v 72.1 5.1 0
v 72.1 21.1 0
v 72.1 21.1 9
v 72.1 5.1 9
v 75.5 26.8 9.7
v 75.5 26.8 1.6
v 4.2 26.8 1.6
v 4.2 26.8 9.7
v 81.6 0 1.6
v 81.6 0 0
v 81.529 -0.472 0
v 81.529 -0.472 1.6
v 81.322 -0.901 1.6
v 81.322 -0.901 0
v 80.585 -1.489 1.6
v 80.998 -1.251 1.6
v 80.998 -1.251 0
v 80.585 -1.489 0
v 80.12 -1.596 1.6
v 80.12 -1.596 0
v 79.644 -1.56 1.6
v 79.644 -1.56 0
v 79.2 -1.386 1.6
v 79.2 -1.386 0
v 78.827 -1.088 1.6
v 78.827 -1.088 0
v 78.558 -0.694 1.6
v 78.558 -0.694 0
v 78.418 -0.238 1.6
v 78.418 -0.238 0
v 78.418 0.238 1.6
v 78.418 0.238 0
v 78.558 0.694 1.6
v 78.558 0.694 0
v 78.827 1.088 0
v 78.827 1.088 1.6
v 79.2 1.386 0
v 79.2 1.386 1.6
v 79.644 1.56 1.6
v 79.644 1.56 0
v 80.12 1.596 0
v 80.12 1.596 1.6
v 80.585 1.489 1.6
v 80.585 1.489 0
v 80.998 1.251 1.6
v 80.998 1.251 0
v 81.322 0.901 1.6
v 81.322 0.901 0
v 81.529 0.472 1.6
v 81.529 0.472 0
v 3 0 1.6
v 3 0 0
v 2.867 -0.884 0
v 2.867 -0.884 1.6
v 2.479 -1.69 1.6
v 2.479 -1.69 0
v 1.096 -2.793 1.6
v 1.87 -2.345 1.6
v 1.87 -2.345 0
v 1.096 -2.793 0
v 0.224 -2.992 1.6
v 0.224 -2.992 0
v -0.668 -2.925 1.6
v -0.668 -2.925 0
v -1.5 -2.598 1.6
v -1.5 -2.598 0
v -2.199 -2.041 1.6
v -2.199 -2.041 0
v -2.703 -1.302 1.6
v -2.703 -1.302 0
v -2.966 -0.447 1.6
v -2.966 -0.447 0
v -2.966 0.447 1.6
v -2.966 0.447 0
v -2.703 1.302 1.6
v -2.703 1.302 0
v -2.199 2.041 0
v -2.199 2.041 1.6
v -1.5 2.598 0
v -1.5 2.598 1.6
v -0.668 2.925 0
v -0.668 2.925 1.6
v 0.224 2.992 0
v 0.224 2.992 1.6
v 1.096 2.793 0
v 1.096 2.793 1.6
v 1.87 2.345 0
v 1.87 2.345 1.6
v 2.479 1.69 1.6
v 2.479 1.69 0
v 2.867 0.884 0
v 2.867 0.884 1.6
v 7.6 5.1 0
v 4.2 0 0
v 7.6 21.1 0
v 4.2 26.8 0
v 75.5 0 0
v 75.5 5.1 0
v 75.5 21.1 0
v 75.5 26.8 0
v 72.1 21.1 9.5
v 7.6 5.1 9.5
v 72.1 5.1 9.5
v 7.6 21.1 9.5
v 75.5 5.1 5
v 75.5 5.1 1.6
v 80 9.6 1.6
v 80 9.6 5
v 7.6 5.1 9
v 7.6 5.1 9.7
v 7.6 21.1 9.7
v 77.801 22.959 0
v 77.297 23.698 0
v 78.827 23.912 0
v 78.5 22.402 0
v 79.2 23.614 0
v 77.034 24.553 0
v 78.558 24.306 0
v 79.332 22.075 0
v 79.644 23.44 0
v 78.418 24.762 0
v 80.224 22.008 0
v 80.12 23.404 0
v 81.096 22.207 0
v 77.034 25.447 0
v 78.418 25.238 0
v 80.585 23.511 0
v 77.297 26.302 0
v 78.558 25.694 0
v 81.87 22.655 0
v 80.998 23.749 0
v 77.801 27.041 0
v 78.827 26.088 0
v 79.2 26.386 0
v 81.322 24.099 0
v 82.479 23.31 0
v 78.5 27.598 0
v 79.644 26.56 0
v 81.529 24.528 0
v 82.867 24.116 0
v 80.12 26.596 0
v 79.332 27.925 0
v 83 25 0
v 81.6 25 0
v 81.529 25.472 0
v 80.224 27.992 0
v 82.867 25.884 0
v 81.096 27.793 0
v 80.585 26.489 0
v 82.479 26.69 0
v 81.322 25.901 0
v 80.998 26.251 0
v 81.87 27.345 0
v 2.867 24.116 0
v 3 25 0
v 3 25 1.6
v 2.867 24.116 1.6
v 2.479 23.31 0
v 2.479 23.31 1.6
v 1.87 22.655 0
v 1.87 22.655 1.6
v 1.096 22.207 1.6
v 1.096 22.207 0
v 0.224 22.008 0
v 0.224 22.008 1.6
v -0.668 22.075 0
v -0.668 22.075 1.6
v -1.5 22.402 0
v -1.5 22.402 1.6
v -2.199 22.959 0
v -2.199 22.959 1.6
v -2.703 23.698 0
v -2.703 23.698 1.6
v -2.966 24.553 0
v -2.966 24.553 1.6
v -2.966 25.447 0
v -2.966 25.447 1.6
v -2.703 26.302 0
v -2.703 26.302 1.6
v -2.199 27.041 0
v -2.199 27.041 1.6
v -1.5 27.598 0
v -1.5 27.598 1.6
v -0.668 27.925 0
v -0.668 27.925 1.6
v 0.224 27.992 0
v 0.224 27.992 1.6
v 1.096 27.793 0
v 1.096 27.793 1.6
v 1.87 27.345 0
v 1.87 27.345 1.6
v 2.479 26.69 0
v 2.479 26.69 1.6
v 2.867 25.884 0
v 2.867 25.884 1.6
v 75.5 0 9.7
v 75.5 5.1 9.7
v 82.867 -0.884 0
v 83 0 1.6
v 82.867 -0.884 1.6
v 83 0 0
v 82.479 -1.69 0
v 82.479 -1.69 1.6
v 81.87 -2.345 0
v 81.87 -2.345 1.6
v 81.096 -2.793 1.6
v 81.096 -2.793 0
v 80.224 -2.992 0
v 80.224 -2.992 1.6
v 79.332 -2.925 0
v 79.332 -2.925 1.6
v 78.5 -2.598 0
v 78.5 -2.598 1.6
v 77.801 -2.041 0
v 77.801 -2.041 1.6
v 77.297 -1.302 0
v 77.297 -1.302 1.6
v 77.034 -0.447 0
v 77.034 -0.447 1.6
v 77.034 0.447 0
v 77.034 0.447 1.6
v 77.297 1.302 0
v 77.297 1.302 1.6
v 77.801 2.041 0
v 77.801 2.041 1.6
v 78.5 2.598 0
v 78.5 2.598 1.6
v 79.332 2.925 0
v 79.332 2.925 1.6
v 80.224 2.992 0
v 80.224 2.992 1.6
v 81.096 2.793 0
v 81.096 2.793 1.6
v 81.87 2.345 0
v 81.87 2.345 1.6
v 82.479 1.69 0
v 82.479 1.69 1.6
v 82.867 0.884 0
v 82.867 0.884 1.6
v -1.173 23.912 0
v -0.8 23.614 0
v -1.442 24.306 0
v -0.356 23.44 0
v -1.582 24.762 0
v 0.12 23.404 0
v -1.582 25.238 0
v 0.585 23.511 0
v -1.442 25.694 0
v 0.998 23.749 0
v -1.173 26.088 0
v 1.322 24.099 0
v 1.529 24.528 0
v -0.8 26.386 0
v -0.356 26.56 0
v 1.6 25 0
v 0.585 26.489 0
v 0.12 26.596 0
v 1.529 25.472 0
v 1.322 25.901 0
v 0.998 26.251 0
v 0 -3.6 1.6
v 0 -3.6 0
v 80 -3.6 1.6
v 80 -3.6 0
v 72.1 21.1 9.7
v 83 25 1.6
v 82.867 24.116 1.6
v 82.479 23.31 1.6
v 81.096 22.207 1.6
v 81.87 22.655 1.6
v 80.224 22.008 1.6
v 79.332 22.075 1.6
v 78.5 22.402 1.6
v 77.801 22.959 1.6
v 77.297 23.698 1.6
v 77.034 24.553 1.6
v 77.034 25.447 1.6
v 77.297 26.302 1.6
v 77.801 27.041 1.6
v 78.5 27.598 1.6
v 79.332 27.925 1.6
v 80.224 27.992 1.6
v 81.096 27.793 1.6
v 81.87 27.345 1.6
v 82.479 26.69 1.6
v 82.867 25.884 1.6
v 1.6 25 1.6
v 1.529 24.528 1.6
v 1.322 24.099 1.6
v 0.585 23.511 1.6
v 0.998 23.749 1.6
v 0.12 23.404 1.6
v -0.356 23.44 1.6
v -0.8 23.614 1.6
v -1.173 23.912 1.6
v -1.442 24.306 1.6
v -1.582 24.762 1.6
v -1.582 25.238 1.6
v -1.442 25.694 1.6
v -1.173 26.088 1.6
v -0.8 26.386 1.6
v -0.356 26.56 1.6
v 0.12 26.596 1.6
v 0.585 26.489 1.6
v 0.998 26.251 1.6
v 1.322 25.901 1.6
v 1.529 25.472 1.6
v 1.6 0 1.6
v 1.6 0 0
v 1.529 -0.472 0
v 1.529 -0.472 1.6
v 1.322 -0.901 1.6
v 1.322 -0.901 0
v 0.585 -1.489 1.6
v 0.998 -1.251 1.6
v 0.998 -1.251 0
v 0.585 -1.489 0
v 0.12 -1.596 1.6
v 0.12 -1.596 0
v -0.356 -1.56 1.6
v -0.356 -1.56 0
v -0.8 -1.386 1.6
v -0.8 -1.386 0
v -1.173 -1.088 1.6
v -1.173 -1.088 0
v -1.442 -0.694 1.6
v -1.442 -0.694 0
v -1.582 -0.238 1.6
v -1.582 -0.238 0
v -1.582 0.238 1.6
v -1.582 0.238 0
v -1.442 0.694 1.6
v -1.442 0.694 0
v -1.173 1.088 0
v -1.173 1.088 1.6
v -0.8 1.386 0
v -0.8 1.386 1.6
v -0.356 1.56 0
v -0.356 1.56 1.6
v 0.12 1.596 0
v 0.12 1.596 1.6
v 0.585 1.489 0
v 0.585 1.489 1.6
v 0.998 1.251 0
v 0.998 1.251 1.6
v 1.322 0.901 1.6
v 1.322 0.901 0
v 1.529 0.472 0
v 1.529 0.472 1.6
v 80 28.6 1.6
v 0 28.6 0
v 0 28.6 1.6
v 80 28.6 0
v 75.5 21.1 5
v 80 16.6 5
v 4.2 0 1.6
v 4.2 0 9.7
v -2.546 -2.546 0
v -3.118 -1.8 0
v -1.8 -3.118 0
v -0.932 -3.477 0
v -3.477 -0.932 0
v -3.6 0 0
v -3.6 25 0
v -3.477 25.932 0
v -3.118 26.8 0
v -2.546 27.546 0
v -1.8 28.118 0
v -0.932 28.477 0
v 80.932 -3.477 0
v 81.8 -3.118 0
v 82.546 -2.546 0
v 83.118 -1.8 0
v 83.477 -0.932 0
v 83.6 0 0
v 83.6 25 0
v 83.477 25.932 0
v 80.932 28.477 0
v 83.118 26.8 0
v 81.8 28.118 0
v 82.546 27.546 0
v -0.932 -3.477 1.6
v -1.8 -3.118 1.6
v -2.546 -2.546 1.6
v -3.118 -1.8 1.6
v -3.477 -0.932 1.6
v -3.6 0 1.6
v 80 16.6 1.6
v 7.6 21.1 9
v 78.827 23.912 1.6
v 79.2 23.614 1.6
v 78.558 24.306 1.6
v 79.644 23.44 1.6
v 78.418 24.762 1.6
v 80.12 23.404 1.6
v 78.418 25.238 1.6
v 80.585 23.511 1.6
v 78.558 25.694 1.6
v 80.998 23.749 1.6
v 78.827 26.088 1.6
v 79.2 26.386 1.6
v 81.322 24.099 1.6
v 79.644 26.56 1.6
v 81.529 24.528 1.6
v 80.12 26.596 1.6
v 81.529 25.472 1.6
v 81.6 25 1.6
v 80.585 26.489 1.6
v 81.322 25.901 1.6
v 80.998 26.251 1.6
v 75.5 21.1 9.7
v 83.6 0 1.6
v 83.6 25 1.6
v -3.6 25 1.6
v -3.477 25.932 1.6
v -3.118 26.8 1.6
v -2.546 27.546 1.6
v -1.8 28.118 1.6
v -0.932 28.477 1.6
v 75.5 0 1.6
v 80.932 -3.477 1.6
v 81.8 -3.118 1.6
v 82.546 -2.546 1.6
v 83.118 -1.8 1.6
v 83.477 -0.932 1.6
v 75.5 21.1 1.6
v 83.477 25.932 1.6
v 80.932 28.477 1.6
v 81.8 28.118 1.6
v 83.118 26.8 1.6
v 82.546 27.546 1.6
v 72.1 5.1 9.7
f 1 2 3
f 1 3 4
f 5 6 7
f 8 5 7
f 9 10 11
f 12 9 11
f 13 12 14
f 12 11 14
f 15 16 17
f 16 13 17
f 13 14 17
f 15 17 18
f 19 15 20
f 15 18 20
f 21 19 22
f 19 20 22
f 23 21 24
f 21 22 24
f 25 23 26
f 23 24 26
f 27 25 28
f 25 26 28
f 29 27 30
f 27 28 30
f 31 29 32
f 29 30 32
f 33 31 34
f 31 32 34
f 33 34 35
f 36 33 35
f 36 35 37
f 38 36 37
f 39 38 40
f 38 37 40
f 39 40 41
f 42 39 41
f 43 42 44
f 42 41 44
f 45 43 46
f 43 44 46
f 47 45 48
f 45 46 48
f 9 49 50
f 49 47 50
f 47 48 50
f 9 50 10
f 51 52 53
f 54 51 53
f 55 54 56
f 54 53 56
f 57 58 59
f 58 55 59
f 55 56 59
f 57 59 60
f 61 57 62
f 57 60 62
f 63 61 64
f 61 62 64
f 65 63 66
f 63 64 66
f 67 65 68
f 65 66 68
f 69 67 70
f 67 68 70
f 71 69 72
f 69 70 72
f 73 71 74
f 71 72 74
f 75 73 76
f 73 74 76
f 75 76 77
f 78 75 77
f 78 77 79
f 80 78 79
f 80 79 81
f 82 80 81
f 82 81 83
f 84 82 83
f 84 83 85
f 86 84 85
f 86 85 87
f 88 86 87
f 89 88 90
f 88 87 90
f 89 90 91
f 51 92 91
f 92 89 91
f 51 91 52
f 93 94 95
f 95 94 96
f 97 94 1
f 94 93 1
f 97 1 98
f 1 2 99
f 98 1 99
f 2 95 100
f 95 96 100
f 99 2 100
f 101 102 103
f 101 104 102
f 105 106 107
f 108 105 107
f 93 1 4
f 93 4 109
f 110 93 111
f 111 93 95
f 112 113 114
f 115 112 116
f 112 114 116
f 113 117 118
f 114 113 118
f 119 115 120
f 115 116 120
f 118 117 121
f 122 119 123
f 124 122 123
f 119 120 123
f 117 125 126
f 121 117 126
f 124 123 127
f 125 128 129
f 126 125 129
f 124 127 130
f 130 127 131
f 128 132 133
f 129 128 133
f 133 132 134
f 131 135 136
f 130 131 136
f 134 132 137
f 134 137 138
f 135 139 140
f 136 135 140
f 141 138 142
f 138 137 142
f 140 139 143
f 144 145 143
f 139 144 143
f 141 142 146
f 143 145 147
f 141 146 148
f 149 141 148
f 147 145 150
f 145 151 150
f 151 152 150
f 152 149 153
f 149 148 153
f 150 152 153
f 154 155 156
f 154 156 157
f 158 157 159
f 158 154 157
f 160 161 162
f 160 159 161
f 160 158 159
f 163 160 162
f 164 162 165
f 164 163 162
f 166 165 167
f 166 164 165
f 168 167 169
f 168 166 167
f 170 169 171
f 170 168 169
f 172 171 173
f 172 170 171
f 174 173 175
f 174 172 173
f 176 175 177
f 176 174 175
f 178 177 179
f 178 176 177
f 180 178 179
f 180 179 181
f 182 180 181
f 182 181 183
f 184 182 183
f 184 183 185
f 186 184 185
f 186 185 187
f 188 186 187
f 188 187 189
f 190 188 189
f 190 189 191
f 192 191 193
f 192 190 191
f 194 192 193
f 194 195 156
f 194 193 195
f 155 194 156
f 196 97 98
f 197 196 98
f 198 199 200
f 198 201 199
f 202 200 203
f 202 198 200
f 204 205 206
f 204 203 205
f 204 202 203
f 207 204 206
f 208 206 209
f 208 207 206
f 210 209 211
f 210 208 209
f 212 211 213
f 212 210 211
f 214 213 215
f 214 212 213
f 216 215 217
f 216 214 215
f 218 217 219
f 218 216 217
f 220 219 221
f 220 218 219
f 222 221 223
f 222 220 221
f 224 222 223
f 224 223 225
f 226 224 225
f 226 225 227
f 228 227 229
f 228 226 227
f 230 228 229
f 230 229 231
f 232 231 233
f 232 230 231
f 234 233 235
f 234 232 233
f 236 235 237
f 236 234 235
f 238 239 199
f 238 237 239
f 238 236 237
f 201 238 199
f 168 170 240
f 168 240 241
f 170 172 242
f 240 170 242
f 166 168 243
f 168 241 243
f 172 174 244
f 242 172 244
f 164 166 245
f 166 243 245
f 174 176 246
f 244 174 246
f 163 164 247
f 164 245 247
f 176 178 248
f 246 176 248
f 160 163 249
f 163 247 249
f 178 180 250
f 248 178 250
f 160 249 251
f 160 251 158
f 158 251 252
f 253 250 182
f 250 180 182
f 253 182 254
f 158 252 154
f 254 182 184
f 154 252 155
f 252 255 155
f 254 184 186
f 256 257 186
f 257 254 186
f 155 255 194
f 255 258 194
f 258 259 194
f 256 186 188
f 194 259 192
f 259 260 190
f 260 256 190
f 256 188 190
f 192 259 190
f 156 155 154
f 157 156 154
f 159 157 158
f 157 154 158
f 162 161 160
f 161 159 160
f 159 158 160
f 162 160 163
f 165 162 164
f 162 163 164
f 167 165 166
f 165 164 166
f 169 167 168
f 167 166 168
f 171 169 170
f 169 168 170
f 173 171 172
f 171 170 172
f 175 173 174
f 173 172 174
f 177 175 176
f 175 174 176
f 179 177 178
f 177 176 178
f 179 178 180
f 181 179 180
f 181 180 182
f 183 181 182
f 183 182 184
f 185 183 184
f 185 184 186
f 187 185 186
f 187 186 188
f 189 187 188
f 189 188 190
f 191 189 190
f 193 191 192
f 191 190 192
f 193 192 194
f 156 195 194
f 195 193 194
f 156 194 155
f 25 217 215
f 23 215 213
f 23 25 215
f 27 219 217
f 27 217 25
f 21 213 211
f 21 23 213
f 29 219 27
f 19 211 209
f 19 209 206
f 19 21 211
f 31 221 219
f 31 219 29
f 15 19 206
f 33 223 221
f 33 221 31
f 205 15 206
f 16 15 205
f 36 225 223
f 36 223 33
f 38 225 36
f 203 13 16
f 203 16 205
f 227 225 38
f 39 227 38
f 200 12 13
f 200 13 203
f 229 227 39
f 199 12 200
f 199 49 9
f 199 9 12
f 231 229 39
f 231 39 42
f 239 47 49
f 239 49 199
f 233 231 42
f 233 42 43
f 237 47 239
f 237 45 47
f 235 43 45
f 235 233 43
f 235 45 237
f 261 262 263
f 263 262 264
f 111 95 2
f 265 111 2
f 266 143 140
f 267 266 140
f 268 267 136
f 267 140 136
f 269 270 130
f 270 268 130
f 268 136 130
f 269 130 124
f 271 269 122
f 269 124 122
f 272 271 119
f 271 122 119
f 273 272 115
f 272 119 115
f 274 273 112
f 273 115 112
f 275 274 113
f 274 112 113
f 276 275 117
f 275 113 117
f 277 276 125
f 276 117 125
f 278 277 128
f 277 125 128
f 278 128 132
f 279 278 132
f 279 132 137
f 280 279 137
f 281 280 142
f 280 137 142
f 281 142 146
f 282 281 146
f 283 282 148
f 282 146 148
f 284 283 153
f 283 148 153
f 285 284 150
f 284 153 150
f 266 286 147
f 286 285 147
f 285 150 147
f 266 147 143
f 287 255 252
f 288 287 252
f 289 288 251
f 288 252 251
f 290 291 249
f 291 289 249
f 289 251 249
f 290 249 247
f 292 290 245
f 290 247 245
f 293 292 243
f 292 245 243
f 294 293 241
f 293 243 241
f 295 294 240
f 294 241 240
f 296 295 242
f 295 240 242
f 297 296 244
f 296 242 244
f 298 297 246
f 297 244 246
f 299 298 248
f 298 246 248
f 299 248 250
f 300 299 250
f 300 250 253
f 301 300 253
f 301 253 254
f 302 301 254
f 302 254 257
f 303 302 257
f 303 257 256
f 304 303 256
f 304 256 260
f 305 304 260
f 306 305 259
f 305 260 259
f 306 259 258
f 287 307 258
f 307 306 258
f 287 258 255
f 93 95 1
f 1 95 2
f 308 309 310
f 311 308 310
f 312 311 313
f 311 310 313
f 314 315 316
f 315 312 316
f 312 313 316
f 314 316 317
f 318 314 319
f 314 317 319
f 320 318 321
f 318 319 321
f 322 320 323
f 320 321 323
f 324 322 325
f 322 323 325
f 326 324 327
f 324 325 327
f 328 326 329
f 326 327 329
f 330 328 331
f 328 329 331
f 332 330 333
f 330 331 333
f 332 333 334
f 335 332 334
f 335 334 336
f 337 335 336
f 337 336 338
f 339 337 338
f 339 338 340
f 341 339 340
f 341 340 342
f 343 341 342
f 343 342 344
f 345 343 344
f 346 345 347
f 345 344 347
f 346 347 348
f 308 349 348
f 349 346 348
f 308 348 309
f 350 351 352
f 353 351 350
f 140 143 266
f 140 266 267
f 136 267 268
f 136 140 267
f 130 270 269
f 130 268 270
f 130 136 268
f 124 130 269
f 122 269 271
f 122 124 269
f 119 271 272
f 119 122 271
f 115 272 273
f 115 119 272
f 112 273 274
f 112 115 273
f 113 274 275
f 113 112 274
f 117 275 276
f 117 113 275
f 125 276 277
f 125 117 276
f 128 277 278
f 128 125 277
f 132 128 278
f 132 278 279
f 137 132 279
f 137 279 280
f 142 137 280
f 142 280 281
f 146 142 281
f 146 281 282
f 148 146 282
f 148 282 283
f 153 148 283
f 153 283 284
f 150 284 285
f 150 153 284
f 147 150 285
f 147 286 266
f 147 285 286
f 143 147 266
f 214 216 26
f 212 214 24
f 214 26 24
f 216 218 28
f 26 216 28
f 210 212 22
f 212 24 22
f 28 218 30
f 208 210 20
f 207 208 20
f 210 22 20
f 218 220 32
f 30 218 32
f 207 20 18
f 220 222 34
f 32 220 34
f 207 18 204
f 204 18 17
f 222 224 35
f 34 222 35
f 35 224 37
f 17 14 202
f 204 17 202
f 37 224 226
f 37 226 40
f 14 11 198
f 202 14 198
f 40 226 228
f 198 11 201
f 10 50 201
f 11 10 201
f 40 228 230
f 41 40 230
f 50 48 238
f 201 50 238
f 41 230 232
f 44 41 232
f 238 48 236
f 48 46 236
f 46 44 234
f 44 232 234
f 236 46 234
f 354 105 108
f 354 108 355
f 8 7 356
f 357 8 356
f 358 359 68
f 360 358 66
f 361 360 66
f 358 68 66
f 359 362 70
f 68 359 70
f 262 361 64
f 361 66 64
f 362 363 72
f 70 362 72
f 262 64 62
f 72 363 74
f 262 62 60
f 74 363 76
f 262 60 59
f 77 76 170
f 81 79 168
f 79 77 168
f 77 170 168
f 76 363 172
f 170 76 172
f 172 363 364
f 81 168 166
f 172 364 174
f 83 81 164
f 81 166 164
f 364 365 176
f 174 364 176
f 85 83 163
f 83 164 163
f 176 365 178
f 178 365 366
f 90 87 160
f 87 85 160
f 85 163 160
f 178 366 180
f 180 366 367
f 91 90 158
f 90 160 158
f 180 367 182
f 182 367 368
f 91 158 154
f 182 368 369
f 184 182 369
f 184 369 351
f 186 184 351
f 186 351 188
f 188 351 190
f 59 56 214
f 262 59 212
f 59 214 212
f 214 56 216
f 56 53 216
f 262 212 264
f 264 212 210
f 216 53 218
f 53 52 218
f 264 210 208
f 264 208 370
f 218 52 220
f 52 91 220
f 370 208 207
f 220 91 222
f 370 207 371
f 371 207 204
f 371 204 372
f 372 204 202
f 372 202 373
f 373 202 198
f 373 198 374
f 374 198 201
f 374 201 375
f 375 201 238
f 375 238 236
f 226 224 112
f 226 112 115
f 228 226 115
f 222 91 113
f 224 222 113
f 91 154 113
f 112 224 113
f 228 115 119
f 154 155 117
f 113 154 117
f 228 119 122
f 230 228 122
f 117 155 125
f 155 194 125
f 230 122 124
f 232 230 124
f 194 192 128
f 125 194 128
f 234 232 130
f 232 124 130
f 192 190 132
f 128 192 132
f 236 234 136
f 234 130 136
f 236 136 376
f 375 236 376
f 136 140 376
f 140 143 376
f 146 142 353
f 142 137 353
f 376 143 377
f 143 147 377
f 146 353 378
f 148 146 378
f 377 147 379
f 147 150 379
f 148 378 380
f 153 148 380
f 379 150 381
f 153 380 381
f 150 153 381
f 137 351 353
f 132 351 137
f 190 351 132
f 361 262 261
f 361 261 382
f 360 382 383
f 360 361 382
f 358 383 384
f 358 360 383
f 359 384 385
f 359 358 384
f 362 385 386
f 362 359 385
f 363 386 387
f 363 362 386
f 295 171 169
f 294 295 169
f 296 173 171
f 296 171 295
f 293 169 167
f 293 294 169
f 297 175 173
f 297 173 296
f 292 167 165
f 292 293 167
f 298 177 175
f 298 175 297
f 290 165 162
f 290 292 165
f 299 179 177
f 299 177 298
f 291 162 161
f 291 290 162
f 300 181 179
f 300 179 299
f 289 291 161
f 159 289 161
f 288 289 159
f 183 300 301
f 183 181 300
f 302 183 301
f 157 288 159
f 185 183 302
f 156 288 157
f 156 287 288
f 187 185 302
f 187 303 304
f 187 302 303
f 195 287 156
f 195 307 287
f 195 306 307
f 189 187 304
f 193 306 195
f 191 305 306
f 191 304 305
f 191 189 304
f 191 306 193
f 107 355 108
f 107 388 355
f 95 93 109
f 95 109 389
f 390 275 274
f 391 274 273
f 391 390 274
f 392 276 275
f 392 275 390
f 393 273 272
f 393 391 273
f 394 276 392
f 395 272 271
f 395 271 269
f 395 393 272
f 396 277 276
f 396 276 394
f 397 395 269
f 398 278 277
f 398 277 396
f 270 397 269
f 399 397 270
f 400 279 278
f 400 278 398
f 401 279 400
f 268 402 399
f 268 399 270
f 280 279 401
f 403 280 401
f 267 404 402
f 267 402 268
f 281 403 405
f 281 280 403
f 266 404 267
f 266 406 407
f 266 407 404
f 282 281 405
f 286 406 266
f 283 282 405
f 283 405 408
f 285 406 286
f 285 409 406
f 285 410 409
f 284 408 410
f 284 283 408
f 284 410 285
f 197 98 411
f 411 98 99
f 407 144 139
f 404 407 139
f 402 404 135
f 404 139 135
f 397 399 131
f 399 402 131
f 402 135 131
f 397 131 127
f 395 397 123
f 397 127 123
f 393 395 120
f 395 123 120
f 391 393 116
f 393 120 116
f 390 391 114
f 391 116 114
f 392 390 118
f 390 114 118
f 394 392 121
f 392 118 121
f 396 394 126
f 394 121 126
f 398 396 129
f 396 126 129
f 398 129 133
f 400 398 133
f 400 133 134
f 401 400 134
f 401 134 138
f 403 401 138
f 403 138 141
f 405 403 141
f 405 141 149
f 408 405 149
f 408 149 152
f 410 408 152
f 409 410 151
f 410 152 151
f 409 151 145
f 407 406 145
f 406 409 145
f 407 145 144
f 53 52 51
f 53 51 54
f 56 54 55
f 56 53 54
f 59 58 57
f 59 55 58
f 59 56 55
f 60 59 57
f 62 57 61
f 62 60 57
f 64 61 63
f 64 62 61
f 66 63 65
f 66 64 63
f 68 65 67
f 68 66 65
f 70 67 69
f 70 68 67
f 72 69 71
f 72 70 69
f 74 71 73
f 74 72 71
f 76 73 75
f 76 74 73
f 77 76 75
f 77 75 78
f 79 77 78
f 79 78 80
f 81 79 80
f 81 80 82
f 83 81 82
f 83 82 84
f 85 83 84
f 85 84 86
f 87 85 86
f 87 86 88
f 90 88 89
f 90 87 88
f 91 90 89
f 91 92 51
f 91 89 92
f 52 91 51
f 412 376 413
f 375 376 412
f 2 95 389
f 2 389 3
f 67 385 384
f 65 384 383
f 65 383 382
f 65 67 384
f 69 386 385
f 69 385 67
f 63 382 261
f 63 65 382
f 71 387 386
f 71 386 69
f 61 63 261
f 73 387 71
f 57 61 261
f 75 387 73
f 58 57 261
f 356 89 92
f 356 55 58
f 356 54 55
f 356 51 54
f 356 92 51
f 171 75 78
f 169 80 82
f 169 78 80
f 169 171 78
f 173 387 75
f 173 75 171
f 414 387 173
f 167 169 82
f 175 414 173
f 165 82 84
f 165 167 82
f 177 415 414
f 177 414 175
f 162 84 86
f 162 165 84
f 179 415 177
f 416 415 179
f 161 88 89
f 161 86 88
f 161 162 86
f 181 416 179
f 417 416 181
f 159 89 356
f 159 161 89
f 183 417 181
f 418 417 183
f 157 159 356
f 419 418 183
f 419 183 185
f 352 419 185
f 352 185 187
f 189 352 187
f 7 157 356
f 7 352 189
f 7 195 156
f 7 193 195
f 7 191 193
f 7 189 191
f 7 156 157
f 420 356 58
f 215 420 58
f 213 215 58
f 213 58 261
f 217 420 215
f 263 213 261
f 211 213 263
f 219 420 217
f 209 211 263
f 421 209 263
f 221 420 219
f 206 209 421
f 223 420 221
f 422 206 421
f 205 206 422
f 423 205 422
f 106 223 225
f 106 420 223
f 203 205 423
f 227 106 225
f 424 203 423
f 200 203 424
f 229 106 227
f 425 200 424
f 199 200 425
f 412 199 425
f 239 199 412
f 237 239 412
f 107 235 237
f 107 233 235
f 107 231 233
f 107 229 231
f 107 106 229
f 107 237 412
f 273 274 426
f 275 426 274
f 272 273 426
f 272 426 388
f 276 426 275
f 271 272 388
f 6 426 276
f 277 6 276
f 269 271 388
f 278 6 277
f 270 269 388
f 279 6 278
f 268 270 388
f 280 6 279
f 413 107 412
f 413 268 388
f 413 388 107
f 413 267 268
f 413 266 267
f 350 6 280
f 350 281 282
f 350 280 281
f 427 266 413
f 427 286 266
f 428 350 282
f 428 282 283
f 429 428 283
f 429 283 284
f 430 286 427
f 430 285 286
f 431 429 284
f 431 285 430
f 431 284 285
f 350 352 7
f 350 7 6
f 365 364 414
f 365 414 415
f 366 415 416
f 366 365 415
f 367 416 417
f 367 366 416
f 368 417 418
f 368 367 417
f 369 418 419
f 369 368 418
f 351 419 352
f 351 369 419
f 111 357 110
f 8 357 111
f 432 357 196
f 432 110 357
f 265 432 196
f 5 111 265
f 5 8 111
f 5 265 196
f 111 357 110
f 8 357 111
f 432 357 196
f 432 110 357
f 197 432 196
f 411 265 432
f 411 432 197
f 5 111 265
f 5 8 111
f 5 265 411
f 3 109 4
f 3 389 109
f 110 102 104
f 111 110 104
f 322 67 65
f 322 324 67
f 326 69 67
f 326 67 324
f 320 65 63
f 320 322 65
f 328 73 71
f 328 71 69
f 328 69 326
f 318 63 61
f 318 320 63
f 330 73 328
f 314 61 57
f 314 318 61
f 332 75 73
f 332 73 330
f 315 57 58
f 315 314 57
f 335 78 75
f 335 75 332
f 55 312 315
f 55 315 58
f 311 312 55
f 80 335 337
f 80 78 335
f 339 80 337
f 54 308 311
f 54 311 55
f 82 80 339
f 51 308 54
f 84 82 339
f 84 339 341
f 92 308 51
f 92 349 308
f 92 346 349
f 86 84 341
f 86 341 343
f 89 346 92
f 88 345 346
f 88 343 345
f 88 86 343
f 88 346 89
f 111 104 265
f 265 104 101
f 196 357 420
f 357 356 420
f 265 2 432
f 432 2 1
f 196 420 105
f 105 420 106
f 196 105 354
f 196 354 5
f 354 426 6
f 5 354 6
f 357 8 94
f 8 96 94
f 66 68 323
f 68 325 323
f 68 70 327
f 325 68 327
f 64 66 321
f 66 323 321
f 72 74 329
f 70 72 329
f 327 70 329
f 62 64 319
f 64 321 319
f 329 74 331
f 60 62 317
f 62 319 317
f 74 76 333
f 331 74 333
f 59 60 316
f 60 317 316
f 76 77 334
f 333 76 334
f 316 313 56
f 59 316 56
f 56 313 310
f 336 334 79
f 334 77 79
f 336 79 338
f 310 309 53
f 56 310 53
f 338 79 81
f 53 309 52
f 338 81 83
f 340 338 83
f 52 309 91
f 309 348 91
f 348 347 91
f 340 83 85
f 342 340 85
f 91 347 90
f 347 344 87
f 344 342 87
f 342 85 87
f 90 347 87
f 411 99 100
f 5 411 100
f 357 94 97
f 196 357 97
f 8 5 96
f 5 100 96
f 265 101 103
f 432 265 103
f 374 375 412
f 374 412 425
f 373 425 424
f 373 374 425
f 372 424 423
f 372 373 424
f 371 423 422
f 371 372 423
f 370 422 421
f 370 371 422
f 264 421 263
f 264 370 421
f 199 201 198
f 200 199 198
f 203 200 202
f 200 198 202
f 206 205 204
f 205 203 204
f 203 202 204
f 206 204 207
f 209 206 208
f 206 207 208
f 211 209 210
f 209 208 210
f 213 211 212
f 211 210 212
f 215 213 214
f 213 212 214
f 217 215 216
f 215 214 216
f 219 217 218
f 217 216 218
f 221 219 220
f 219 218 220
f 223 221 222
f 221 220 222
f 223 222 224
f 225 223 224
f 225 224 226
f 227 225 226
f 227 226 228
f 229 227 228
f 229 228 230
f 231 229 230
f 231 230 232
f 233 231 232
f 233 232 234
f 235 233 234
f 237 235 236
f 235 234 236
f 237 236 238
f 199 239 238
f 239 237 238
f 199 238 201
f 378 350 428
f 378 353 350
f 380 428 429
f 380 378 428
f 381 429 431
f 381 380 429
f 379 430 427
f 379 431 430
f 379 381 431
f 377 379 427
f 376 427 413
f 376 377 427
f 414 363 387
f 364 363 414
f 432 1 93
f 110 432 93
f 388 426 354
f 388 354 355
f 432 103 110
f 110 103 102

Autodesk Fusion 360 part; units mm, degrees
sketch "Skizze1" plane through (0, 0, 0) normal (0, 0, 1) x (1, 0, 0) in component "i2c display"
  circle A0 centre (0, 0) radius 3.6
  circle A1 centre (0, 25) radius 3.6
  circle A2 centre (80, 25) radius 3.6
  circle A3 centre (80, 0) radius 3.6
  line L0 (0, -3.6) -> (80, -3.6)
  line L1 (-3.6, 0) -> (-3.6, 25)
  line L2 (0, 28.6) -> (80, 28.6)
  line L3 (83.6, 25) -> (83.6, 0)
  line L4 (4.2, 0) -> (75.5, 0)
  line L5 (75.5, 0) -> (75.5, 26.8)
  line L6 (75.5, 26.8) -> (4.2, 26.8)
  line L7 (4.2, 26.8) -> (4.2, 0)
  line L8 (7.6, 21.1) -> (72.1, 21.1)
  line L9 (72.1, 21.1) -> (72.1, 5.1)
  line L10 (72.1, 5.1) -> (7.6, 5.1)
  line L11 (7.6, 5.1) -> (7.6, 21.1)
  circle A4 centre (0, 0) radius 3
  circle A5 centre (0, 25) radius 3
  circle A6 centre (80, 25) radius 3
  circle A7 centre (80, 0) radius 3
  circle A8 centre (0, 25) radius 1.6
  circle A9 centre (0, 0) radius 1.6
  circle A10 centre (80, 25) radius 1.6
  circle A11 centre (80, 0) radius 1.6
  line L12 (75.5, 5.1) -> (80, 9.6)
  line L13 (75.5, 5.1) -> (81.864, 5.1) construction
  line L14 (75.5, 21.1) -> (80, 16.6)
  line L15 (80, 16.6) -> (80, 9.6)
  dimension "d1" = 7.2
  dimension "d2" = 7.2
  dimension "d3" = 80
  dimension "d5" = 7.2
  dimension "d6" = 7.2
  dimension "d8" = 7.8
  dimension "d9" = 71.3
  dimension "d10" = 26.8
  dimension "d14" = 64.5
  dimension "d15" = 16
  dimension "d16" = 6
  dimension "d17" = 6
  dimension "d18" = 6
  dimension "d19" = 6
  dimension "d20" = 3.2
  dimension "d21" = 3.2
  dimension "d22" = 3.2
  dimension "d23" = 3.2
  dimension "d32" = 45
  dimension "d33" = 90
extrude "Extrusion1" add sketch "Skizze1" along normal blind 1.6 contours A0 | A0 A1 A2 A3 L0 L1 L2 L3 | A1 | A3 | A2 | L5 L12 L14 L15 makes body 1 in component "i2c display"
extrude "Extrusion2" add sketch "Skizze1" along normal blind 1.6 separate body contours A4 | A5 | A6 | A7 makes body 2 at (2.9851, -0.2987, 1.0667) makes body 3 at (78.6314, -2.6696, 0.5333) makes body 4 at (2.9851, 24.7013, 1.0667) makes body 5 at (82.9851, 24.7013, 1.0667) in component "i2c display"
extrude "Extrusion3" add sketch "Skizze1" along normal blind 9.7 contours L4 L5 L6 L7 bodies 1 in component "i2c display"
extrude "Extrusion4" add sketch "Skizze1" along normal blind 9.5 contours L8 L9 L10 L11 bodies 1 in component "i2c display"
extrude "Extrusion5" add sketch "Skizze1" along normal blind 3.5 separate body contours L5 L12 L14 L15 makes body 6 in component "i2c display"
extrude "Extrusion6" add 1 faces at (77, 14.2667, 3.5) along direction (0, 0, 1) blind 0.5 on bodies 6 bodies 6 2 3 4 5 1 in component "i2c display"
extrude "Extrusion7" add 1 faces at (77, 14.2667, 4) along direction (0, 0, 1) blind 1 on bodies 6 bodies 6 in component "i2c display"
extrude "Extrusion8" add sketch "Skizze1" along normal blind 9 separate body contours L8 L9 L10 L11 makes body 7 in component "i2c display"
extrude "Extrusion9" add sketch "Skizze1" along normal blind 9.7 separate body contours L4 L5 L6 L7 makes body 8 in component "i2c display"
component "i2c display" placed x (1, 0, 0) y (0, 1, 0) z (0, 0, 1) at (0, 0, 0)
